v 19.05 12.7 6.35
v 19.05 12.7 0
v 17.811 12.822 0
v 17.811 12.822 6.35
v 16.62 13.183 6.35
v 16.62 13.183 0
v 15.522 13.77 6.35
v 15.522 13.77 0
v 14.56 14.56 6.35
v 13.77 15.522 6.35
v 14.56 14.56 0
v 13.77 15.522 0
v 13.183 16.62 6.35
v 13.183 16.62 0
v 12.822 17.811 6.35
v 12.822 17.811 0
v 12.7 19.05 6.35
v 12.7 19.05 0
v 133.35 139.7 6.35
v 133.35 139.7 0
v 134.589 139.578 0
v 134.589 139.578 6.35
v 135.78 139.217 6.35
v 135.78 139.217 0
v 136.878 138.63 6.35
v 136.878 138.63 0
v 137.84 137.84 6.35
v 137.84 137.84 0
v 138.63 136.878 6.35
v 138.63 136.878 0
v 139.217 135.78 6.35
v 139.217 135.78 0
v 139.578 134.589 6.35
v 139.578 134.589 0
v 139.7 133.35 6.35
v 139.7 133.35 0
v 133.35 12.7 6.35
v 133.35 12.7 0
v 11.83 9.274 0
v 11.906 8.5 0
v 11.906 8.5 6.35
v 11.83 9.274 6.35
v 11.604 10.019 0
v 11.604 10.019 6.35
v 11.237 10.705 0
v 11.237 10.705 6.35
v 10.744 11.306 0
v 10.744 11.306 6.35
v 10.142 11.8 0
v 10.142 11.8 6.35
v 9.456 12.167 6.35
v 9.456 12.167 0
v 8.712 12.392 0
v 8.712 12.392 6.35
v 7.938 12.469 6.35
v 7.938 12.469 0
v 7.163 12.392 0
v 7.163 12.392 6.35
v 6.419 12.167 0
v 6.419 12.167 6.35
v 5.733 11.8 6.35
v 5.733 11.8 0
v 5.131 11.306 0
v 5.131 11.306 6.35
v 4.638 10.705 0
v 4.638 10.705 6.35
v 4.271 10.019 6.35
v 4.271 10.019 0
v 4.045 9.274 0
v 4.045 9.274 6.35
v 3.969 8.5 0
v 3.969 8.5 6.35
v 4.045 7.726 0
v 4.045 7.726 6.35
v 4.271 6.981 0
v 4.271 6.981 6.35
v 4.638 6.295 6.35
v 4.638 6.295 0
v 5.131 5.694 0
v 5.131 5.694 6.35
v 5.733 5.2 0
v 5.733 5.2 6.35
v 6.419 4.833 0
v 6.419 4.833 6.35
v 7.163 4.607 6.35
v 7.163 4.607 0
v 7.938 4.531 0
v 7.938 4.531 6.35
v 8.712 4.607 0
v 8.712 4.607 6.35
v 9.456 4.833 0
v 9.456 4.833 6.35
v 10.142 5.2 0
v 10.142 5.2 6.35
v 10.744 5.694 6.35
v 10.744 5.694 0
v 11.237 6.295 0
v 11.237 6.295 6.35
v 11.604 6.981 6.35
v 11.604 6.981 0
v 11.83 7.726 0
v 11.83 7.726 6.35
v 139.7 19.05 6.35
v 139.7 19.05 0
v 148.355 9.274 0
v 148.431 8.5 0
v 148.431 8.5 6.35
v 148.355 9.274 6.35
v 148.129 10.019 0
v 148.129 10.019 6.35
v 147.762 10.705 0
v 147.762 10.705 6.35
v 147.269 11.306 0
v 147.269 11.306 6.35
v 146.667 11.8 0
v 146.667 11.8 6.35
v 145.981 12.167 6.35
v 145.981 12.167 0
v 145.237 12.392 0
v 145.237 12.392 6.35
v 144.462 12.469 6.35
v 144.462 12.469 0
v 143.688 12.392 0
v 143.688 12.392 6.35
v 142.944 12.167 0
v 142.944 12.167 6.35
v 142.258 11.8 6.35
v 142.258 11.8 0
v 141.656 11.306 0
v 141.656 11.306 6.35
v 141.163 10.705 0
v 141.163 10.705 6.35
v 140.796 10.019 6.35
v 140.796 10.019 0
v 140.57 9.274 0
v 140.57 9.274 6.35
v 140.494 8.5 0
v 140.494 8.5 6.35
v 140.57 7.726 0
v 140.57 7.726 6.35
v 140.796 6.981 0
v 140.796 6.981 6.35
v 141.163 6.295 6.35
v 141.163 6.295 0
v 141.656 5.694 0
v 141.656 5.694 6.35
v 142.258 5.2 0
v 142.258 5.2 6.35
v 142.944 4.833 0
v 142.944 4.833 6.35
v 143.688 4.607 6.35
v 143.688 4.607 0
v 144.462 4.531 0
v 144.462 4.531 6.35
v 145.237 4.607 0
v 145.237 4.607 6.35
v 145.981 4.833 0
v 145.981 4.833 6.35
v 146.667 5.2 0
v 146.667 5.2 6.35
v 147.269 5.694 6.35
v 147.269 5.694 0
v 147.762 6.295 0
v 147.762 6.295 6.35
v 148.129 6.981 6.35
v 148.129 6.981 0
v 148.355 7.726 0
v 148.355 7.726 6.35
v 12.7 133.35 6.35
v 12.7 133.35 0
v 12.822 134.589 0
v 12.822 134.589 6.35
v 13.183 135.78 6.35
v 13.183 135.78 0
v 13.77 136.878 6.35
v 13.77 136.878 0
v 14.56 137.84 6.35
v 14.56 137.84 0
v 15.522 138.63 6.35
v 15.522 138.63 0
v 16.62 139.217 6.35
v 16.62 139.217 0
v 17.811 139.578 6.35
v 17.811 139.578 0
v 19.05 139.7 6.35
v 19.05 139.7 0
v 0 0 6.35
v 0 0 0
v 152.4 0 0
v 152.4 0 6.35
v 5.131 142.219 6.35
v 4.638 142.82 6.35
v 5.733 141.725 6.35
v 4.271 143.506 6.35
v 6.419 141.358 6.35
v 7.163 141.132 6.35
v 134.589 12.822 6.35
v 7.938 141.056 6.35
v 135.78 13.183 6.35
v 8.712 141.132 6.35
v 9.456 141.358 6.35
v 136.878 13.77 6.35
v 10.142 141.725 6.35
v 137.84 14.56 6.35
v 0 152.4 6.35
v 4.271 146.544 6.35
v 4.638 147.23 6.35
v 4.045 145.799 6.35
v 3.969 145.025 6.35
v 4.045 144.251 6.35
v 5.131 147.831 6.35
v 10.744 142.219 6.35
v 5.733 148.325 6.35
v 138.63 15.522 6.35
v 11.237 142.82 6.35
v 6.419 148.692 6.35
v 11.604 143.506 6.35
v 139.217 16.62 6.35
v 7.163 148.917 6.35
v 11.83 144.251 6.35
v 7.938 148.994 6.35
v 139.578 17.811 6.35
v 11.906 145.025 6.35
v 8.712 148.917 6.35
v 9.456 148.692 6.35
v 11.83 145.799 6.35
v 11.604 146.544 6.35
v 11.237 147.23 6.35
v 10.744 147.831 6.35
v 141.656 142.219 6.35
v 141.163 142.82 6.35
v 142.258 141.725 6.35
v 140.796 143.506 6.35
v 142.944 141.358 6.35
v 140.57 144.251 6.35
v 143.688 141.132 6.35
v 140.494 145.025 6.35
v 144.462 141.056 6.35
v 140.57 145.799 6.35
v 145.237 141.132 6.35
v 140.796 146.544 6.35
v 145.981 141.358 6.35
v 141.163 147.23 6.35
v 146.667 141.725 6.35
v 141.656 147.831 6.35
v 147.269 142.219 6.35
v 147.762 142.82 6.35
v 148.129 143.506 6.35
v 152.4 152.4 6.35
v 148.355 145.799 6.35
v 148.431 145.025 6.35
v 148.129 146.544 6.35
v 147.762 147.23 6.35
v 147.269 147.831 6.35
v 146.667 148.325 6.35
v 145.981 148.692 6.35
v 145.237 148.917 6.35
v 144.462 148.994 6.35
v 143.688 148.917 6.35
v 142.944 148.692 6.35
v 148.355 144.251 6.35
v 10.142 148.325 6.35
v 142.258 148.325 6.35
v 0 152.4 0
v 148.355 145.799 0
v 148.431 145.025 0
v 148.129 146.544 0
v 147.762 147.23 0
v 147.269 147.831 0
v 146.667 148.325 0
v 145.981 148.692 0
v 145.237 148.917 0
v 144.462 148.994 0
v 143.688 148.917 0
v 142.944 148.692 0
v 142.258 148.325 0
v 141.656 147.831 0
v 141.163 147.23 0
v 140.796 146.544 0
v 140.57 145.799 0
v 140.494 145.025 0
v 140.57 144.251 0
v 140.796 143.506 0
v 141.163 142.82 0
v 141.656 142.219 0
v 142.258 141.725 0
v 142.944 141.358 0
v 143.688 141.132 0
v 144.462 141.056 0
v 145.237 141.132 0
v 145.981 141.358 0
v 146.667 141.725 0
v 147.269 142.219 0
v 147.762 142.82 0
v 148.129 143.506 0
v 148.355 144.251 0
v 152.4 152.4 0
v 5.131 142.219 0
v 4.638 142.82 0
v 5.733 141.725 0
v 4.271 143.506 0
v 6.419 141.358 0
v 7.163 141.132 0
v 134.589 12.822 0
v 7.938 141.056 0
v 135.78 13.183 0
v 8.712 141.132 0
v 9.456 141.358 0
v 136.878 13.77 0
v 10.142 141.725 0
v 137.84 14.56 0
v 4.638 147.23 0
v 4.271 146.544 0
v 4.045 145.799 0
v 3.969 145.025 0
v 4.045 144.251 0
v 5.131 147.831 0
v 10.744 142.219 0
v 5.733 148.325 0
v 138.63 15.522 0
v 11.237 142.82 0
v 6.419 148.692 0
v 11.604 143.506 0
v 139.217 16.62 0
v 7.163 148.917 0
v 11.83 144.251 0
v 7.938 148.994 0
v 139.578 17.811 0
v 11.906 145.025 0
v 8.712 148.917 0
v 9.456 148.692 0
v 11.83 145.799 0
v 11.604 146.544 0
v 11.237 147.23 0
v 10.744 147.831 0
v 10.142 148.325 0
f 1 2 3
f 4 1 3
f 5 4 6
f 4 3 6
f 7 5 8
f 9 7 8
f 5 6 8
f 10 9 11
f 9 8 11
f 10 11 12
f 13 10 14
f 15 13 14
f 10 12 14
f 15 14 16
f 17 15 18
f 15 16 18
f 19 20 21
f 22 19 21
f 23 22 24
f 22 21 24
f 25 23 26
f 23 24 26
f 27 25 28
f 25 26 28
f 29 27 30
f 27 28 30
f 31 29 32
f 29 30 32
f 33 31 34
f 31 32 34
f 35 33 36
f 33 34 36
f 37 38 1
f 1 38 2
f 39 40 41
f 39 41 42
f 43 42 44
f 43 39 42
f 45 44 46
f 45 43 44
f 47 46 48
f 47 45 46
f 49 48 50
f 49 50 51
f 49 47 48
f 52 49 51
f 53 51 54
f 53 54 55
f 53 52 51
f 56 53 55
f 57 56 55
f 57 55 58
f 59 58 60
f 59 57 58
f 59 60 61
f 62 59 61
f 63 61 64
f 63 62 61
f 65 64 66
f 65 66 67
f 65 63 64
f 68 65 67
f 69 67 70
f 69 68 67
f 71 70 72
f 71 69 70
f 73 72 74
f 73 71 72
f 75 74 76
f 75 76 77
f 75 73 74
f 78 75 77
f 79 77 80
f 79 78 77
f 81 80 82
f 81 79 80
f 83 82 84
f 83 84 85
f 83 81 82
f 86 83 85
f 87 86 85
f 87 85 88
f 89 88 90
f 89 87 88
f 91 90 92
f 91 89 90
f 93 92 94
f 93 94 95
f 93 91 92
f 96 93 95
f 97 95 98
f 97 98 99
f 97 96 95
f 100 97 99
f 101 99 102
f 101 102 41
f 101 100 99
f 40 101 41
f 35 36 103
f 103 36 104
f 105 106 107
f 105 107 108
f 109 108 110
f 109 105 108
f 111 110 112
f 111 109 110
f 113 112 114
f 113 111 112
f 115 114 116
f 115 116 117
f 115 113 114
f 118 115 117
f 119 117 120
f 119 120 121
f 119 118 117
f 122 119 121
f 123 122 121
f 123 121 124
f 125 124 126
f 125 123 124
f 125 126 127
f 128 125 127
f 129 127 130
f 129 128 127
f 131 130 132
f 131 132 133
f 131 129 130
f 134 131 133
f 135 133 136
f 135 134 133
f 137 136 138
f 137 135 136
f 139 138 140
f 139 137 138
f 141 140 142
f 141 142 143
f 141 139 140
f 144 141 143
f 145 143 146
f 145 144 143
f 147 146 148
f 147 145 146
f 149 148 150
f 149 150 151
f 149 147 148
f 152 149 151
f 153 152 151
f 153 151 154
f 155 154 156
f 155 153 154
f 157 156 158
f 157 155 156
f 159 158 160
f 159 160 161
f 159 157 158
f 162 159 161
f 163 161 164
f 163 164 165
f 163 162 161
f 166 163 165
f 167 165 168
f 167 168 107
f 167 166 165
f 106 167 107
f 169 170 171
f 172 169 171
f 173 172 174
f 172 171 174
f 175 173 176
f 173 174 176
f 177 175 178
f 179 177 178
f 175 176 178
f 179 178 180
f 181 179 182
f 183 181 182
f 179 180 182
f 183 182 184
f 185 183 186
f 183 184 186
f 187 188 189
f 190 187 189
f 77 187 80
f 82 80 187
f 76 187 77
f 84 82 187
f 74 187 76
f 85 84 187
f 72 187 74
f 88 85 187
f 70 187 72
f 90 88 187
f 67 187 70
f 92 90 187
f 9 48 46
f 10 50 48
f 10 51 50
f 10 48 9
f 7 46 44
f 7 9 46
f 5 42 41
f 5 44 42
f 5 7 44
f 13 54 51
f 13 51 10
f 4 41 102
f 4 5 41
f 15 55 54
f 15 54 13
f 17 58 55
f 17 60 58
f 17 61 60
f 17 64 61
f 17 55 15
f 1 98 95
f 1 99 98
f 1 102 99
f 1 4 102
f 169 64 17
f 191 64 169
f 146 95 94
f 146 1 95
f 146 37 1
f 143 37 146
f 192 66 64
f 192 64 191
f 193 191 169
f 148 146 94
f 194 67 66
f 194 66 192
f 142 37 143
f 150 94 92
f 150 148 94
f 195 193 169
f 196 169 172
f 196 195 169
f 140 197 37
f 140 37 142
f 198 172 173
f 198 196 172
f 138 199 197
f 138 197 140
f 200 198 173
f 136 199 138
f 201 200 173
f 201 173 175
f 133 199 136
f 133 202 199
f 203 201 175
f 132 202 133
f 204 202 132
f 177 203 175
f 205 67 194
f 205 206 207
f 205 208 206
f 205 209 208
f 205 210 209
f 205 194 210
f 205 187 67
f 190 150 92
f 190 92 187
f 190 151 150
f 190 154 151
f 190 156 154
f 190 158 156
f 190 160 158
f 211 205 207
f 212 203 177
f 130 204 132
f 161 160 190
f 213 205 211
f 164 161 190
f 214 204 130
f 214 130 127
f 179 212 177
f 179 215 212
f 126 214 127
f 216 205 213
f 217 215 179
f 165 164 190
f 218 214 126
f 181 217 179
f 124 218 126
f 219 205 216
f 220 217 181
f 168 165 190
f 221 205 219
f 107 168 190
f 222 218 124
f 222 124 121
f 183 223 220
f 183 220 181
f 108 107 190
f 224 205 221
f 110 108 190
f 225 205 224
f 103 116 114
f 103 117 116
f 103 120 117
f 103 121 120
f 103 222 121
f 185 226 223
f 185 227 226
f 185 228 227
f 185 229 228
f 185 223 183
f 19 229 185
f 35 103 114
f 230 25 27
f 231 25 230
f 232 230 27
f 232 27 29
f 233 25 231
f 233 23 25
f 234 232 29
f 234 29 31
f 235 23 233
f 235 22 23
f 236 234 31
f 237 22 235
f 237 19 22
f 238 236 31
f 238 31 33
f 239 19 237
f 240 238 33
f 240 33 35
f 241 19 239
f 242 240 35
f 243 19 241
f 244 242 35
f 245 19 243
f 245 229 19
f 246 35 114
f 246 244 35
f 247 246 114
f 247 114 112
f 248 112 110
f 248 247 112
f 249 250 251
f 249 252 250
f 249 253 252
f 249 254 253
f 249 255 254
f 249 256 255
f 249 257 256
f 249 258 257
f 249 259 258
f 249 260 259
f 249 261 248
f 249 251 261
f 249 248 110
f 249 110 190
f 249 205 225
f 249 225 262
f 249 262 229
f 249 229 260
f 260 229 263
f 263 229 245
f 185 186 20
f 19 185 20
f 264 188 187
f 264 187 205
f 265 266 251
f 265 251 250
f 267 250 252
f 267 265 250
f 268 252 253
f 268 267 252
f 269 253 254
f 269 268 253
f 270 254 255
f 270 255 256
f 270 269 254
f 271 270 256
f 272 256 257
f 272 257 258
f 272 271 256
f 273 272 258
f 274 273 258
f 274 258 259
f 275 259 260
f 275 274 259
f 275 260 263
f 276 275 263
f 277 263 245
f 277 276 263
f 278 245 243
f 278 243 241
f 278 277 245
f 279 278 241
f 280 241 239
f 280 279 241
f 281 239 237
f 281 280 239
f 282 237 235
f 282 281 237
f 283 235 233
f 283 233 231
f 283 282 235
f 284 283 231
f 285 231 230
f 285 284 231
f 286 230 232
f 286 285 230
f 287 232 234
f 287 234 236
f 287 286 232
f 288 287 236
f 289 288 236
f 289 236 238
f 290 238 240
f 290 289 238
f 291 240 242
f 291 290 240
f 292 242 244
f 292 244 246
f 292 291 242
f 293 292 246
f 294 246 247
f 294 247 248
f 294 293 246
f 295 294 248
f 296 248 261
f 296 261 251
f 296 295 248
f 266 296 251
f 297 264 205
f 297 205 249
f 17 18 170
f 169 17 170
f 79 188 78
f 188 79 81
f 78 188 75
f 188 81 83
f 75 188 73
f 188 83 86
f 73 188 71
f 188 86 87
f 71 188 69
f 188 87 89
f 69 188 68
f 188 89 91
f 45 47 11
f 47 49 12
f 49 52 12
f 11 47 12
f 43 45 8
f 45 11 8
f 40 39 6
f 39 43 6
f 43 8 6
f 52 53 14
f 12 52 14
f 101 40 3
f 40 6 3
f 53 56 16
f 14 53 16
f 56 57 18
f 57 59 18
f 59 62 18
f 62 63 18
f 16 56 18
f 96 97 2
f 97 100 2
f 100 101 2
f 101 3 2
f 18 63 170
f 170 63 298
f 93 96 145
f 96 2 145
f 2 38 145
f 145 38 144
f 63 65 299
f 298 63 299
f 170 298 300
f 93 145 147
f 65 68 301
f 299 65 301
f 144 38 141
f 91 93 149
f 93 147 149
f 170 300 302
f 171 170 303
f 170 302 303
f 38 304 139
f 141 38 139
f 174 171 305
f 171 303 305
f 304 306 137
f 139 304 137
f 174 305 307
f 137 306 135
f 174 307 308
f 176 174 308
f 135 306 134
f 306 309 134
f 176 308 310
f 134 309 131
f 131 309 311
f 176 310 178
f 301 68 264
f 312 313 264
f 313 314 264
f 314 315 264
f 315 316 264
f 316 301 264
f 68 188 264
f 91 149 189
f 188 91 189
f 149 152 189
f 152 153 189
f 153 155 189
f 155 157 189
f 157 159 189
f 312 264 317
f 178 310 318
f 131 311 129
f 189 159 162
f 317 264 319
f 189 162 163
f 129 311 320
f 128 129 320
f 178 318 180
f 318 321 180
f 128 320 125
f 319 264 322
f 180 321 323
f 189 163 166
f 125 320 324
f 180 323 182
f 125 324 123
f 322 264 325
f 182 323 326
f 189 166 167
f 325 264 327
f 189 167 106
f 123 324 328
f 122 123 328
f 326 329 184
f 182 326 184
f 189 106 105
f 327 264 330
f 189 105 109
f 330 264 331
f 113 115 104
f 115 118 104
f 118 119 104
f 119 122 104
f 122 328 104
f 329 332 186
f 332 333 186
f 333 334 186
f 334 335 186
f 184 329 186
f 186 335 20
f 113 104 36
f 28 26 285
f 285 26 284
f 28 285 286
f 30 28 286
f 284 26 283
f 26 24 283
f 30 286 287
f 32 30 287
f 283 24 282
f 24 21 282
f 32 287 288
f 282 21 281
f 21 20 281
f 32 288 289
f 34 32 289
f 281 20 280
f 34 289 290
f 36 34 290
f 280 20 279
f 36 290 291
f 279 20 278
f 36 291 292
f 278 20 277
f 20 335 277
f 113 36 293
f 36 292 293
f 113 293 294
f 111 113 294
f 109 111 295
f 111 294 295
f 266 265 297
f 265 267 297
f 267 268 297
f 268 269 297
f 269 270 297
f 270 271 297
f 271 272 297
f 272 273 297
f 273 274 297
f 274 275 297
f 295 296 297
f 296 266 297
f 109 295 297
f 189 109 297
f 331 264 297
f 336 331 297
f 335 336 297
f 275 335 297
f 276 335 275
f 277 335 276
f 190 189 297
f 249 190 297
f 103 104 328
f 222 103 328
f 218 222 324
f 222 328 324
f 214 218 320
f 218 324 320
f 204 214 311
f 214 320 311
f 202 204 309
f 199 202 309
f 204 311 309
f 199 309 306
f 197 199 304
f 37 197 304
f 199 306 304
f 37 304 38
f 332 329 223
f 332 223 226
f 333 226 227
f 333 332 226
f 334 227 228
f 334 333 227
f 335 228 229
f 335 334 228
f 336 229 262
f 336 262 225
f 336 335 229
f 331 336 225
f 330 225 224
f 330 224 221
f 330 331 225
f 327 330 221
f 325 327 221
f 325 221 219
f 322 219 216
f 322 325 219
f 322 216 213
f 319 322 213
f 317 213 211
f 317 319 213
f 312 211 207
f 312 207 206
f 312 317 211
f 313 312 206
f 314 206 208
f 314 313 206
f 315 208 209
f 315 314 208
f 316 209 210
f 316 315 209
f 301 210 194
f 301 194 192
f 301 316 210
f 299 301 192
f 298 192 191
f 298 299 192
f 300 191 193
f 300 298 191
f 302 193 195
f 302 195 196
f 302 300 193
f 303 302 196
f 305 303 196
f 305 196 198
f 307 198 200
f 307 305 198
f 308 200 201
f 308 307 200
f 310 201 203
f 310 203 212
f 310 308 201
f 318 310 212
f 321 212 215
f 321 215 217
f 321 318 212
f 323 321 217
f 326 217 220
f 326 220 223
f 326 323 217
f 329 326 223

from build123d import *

# Parameters (mm, degrees)
F0_W     = 152.4
F0_H     = 152.4
F0_R     = 3.96875
F1_DEPTH = 6.35


with BuildPart() as f1:
    # F0 (on Top) → F1 (new body)
    with BuildSketch(Plane.XY):
        with Locations((76.2, 76.2)):
            Rectangle(F0_W, F0_H)
        with Locations((7.9375, 8.49987)):
            Circle(F0_R, mode=Mode.SUBTRACT)
        with BuildLine():
            Line((133.35, 12.7), (19.05, 12.7))
            ThreePointArc((19.05, 12.7), (14.559872, 14.559872), (12.7, 19.05))
            Line((12.7, 19.05), (12.7, 133.35))
            ThreePointArc((12.7, 133.35), (14.559872, 137.840128), (19.05, 139.7))
            Line((19.05, 139.7), (133.35, 139.7))
            ThreePointArc((133.35, 139.7), (137.840128, 137.840128), (139.7, 133.35))
            Line((139.7, 133.35), (139.7, 19.05))
            ThreePointArc((139.7, 19.05), (137.840128, 14.559872), (133.35, 12.7))
        make_face(mode=Mode.SUBTRACT)
        with Locations((144.4625, 8.49987)):
            Circle(F0_R, mode=Mode.SUBTRACT)
        with Locations((7.9375, 145.02487)):
            Circle(F0_R, mode=Mode.SUBTRACT)
        with Locations((144.4625, 145.02487)):
            Circle(F0_R, mode=Mode.SUBTRACT)
    extrude(amount=F1_DEPTH)


solid = f1.part
